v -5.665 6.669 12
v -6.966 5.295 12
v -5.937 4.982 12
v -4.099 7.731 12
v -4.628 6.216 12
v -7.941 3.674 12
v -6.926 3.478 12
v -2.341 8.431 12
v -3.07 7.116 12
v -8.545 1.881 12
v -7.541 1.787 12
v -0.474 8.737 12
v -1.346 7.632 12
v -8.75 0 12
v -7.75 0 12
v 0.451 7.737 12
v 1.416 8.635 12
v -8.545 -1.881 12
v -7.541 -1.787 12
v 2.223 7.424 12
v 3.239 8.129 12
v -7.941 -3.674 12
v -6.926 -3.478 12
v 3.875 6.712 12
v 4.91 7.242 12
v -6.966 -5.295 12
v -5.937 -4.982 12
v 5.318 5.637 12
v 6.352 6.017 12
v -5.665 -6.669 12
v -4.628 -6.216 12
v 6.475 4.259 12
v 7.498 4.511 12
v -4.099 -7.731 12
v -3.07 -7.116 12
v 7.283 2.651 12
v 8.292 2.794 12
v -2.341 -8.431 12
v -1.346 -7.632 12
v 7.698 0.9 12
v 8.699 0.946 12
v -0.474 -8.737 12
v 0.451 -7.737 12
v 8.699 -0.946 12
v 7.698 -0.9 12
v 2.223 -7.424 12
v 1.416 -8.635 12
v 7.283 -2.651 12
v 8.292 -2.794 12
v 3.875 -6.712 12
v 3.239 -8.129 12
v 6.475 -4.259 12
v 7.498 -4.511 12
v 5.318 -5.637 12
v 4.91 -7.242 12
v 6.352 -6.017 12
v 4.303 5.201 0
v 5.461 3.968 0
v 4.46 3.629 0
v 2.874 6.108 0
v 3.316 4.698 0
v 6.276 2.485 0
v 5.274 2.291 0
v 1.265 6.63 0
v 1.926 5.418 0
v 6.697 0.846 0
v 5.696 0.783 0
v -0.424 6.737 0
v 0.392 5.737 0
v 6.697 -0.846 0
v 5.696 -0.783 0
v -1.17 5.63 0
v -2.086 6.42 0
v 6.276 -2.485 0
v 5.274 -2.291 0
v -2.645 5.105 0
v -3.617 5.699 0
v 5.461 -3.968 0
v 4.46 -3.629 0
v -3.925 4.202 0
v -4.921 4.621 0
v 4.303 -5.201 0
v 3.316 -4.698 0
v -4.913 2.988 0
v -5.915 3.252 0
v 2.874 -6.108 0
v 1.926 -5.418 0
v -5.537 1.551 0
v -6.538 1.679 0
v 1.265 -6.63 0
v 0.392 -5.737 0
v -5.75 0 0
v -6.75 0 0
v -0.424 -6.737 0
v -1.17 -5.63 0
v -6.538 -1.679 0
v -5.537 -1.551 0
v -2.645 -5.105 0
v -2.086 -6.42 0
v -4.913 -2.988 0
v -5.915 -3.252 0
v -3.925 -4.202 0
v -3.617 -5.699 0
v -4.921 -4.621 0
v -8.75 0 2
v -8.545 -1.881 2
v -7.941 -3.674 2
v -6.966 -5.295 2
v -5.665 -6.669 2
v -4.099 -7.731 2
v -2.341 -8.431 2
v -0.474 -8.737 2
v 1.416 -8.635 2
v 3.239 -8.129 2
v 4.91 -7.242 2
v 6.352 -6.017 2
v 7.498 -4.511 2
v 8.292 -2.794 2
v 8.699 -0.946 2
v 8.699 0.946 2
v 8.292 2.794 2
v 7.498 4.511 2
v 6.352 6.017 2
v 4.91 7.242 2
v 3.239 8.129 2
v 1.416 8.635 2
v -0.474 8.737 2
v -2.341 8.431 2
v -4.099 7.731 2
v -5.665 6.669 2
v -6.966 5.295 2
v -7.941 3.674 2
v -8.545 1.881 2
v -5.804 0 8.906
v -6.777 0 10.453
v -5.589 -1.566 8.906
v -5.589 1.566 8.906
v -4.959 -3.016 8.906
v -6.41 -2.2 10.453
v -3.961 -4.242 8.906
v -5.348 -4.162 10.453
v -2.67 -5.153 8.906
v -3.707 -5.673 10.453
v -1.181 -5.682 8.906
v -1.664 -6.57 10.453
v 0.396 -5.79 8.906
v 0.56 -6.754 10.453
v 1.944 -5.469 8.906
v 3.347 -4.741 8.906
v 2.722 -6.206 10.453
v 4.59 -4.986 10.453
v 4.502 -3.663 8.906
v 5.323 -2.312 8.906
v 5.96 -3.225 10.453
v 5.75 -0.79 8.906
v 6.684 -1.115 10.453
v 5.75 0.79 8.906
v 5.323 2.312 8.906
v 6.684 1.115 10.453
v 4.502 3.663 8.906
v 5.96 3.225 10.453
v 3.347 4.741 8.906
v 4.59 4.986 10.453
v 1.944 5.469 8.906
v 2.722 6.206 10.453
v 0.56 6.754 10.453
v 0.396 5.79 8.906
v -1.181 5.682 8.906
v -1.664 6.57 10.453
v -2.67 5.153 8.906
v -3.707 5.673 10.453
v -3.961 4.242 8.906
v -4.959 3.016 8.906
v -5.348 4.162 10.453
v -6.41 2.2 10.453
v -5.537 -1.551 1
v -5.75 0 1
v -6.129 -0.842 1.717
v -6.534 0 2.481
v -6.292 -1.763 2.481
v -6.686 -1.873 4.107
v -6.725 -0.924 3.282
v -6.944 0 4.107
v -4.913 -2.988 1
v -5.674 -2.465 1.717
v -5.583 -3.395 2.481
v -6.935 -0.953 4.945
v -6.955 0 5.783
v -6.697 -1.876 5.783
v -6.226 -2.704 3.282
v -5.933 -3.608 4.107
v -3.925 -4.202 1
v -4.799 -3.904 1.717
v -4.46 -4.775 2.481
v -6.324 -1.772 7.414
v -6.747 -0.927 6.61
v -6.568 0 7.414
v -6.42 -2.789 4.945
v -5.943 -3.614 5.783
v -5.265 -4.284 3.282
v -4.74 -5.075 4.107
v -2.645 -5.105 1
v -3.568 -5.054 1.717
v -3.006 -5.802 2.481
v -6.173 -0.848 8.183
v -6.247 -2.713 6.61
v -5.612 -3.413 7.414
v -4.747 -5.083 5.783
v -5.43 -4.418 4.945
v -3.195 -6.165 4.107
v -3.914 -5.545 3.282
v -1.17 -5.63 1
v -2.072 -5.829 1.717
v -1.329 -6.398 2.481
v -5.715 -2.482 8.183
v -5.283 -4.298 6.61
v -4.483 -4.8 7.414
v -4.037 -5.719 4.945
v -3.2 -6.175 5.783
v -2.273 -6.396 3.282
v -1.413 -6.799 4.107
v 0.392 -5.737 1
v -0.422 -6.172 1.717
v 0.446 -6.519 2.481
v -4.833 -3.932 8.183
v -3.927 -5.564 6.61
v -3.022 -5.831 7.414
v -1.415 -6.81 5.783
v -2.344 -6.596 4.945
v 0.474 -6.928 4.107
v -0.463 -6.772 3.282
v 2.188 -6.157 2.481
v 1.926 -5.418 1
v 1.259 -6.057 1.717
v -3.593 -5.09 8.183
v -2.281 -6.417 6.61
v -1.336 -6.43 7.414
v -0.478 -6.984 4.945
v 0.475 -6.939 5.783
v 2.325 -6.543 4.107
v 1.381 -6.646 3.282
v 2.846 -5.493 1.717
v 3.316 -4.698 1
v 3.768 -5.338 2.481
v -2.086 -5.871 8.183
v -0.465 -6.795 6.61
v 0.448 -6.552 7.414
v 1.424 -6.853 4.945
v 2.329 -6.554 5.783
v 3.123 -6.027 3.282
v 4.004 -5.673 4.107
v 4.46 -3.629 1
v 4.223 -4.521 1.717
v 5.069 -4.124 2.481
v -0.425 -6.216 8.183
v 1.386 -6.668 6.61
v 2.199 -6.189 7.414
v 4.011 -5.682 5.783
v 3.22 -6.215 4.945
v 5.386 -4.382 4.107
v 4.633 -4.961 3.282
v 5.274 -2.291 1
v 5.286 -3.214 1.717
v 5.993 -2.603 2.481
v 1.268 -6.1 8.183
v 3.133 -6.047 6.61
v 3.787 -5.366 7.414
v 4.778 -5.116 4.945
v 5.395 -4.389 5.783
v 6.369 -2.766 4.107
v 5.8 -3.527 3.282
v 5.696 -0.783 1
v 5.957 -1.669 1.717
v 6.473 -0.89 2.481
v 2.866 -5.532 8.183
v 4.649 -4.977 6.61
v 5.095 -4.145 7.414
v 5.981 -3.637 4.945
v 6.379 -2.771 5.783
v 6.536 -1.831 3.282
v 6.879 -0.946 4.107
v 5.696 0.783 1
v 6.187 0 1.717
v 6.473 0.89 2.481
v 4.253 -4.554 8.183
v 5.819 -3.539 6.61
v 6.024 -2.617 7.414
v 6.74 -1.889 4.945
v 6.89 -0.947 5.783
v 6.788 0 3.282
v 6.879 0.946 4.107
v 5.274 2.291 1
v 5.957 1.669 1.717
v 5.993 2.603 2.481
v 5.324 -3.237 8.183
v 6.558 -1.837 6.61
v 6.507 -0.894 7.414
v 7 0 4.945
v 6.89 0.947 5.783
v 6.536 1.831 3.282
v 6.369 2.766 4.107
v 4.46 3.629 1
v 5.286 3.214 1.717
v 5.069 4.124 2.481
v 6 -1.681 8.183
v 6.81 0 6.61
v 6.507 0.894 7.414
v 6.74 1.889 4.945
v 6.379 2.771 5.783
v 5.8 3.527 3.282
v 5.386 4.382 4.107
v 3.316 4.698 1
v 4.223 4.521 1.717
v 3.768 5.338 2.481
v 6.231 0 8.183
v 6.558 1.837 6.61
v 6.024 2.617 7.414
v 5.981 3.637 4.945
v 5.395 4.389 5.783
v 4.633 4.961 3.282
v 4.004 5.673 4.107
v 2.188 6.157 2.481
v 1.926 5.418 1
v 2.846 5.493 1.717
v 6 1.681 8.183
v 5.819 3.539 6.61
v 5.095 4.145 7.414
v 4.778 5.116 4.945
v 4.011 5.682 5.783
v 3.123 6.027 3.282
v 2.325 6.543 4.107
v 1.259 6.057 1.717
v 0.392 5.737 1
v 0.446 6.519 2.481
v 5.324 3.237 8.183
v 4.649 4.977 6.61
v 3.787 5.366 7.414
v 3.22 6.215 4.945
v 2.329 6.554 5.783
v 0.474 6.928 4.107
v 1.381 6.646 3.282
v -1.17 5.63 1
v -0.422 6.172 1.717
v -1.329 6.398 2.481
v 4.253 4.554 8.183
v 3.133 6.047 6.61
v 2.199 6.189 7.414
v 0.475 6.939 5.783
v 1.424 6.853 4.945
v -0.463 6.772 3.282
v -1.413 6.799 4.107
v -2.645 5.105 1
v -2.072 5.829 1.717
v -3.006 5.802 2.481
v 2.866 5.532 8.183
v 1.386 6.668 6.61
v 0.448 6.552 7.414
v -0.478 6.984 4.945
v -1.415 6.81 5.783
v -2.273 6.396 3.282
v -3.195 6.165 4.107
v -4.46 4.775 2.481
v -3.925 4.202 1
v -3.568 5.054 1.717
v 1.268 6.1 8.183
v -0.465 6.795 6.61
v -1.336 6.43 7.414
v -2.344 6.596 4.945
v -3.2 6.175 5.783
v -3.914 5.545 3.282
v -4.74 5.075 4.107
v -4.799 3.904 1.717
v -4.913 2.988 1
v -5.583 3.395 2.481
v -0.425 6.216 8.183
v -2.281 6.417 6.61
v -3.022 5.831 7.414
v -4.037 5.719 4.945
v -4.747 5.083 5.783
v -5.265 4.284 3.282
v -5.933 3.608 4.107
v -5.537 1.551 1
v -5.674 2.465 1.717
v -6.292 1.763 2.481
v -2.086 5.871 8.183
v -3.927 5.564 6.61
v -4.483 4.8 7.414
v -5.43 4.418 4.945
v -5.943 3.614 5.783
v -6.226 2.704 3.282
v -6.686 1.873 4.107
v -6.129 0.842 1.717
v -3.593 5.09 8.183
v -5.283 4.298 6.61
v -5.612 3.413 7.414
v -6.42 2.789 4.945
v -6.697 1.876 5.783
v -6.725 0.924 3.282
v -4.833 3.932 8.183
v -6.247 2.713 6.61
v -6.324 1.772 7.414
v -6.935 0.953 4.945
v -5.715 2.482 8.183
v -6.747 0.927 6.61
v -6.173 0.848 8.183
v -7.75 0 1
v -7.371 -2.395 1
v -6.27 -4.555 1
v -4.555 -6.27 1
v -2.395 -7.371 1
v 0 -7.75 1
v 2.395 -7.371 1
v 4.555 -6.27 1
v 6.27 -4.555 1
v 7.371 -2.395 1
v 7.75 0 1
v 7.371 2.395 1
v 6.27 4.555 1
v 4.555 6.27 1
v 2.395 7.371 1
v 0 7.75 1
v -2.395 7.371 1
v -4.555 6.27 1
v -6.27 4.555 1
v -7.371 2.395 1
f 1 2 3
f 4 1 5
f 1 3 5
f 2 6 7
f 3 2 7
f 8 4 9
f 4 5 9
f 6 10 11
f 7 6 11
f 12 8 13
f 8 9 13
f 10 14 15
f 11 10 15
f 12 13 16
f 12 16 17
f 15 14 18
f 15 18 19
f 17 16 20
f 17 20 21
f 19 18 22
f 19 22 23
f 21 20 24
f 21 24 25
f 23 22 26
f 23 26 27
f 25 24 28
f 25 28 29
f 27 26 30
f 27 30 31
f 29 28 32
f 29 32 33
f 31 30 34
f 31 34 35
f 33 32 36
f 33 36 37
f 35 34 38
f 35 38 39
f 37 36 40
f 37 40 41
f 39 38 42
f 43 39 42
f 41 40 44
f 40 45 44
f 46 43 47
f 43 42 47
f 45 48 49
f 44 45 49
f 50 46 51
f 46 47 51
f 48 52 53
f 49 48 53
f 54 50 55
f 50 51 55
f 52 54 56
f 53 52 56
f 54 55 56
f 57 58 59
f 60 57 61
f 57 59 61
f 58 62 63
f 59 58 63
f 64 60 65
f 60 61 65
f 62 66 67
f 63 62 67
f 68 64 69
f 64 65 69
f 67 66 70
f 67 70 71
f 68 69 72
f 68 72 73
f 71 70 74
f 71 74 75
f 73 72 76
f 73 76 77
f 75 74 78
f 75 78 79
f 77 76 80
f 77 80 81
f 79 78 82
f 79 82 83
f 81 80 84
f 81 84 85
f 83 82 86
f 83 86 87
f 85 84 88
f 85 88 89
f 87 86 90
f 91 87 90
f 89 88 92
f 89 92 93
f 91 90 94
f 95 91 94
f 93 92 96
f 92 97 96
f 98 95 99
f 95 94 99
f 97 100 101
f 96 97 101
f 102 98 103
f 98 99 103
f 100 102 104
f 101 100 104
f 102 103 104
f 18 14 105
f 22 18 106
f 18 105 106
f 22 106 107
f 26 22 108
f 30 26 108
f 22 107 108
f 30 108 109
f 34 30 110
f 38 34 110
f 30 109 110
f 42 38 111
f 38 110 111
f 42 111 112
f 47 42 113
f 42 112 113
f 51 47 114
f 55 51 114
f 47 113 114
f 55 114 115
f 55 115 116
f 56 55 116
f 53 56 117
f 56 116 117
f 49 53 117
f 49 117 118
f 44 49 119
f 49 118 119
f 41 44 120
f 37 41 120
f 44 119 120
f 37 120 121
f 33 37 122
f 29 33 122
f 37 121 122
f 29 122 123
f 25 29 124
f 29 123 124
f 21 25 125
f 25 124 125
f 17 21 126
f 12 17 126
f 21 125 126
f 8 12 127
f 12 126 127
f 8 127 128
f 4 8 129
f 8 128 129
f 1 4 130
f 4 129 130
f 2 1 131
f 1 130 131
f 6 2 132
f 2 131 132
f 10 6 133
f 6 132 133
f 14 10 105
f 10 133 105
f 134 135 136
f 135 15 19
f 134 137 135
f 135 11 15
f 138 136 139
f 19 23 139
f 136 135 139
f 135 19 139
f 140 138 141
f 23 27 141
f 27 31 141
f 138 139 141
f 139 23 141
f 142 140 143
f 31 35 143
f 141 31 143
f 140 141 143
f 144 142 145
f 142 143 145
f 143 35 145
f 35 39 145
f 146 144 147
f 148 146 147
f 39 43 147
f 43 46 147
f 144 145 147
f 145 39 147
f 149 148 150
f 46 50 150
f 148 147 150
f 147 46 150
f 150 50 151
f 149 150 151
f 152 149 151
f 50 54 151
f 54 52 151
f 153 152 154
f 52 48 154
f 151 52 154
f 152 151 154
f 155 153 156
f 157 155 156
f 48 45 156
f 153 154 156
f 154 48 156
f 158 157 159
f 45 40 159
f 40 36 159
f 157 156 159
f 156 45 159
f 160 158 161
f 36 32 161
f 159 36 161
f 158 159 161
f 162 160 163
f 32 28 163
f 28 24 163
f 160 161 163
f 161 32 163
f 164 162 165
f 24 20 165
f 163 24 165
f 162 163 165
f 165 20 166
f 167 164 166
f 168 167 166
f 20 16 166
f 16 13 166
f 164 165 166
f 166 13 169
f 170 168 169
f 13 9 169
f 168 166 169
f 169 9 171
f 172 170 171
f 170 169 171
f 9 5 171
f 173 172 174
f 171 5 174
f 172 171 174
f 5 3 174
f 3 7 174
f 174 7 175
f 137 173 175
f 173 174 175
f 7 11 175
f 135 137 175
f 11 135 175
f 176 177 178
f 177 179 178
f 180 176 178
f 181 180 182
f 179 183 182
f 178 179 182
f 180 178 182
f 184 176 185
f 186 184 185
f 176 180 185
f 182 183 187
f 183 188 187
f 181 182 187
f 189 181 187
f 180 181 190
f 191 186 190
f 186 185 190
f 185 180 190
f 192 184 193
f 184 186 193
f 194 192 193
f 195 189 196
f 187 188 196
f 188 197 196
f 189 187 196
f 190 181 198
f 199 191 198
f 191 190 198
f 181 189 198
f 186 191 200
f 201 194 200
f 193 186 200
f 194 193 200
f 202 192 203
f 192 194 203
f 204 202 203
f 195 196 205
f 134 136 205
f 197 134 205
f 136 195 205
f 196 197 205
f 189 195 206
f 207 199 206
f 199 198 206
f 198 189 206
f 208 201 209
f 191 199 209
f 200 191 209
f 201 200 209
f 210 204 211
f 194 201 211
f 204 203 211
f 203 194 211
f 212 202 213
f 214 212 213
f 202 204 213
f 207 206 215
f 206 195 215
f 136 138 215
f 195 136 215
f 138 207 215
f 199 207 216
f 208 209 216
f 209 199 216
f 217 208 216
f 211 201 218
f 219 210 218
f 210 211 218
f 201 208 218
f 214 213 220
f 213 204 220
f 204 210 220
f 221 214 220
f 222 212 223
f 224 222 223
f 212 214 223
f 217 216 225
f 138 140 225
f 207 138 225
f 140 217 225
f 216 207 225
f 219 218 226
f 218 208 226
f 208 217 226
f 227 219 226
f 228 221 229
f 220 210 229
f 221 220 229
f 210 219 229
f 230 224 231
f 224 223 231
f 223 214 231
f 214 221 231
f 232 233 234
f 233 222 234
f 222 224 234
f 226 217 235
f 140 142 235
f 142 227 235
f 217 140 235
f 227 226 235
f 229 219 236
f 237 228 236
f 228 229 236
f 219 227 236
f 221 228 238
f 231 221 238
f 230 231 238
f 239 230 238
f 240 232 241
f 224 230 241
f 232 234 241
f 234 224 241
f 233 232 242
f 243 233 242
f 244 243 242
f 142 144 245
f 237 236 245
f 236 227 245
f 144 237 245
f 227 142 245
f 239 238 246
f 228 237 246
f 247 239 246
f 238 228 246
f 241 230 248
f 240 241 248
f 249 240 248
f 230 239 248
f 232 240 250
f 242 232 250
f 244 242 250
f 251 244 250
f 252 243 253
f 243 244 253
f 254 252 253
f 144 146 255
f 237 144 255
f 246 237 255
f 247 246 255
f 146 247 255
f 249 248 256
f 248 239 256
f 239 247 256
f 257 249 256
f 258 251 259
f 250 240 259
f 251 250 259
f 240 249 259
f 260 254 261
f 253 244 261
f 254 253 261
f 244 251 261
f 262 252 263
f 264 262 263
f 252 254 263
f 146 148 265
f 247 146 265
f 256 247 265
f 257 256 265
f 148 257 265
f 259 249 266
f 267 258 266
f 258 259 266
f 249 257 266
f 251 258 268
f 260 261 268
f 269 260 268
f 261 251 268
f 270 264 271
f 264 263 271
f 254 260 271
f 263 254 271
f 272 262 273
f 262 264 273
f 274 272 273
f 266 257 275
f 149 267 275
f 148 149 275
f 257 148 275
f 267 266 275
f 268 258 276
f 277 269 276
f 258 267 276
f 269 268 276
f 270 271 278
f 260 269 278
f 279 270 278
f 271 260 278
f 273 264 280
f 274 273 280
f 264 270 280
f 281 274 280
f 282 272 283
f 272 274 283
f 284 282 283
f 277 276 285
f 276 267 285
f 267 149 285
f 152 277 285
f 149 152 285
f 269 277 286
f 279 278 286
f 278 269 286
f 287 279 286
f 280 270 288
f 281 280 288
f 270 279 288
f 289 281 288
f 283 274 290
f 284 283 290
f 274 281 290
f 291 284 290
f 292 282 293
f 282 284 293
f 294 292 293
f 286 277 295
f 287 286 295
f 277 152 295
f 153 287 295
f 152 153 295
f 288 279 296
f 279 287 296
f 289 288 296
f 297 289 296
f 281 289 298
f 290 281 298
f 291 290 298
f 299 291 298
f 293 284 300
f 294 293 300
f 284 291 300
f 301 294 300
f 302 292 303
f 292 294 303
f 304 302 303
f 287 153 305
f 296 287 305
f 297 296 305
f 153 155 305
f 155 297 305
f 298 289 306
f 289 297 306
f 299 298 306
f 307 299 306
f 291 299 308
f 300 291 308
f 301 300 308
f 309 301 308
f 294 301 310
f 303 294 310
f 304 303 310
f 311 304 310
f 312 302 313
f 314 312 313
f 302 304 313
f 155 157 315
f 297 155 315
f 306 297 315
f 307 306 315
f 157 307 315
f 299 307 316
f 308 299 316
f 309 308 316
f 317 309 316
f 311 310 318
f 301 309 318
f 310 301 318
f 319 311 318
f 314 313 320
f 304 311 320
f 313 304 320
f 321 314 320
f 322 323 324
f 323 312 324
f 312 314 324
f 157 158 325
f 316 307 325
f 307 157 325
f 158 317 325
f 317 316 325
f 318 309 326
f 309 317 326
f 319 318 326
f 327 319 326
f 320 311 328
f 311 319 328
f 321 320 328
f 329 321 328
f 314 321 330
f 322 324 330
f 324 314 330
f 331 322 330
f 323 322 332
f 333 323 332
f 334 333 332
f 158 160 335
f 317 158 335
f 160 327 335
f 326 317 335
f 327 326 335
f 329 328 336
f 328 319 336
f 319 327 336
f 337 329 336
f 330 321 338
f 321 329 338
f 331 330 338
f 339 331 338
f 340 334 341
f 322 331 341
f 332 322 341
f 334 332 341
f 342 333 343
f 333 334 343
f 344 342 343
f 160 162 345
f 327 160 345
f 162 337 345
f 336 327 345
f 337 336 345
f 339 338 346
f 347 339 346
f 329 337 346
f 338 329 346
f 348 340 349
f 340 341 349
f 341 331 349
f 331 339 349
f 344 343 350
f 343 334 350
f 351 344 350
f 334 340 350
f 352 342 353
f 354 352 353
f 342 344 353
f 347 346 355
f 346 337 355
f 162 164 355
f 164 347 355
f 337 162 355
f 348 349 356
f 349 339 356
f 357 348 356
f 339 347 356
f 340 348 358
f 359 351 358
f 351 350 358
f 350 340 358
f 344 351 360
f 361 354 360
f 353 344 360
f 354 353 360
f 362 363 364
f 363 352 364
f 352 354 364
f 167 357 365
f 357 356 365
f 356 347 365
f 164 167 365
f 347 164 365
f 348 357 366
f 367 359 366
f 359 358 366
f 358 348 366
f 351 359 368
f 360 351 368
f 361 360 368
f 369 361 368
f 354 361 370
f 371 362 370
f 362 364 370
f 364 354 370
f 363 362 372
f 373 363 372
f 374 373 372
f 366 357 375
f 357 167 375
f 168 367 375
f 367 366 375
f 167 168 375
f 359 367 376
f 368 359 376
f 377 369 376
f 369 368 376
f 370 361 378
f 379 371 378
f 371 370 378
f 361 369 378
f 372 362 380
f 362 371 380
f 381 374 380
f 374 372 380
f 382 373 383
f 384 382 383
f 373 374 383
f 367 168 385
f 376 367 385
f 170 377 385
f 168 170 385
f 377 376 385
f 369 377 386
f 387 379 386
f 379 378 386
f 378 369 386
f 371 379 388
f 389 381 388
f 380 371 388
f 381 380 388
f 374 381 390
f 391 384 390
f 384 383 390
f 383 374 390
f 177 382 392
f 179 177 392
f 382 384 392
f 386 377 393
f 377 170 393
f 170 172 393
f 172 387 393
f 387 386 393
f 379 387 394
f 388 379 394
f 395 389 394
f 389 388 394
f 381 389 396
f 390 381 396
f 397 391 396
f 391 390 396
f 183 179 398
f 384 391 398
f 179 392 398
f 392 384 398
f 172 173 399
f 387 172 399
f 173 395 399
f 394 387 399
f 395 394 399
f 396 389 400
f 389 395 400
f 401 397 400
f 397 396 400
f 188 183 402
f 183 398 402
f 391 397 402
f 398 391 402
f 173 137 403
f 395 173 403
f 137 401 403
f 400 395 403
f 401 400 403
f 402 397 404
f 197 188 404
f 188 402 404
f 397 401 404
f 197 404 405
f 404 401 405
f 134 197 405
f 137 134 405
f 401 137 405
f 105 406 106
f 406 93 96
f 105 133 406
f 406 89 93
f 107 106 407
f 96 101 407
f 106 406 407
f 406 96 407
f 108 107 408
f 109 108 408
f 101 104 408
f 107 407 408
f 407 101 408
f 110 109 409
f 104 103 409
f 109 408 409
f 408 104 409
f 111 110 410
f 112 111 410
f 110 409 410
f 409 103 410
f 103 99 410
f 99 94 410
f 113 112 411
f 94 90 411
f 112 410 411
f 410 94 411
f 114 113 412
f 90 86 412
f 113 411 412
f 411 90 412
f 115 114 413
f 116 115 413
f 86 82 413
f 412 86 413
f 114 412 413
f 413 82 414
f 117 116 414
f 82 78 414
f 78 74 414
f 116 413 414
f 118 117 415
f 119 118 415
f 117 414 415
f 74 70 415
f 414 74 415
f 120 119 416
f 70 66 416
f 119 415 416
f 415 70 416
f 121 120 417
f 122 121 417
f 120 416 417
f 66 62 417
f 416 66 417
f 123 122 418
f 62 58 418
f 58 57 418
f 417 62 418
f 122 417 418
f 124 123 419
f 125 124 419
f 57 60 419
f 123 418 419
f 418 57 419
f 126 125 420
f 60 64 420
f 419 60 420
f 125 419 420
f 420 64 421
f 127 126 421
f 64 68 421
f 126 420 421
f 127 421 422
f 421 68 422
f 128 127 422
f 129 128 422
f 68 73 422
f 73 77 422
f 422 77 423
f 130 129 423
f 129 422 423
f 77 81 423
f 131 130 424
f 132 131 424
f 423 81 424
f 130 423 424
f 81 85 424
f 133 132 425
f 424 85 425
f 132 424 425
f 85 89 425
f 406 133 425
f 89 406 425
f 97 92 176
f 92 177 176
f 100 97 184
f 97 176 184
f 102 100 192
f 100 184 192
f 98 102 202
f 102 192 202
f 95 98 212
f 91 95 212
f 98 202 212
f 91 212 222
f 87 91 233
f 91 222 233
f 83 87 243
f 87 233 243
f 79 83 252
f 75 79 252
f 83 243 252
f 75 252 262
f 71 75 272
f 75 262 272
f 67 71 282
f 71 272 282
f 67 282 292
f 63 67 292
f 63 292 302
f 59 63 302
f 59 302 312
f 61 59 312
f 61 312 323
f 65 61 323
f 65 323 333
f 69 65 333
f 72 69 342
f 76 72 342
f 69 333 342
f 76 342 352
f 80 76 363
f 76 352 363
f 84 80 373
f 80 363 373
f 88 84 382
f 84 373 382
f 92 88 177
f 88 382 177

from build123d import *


with BuildPart() as f1:
    # F0 (on Front) → F1 (revolve)
    with BuildSketch(Plane.XZ):
        with BuildLine():
            ThreePointArc((-5.75, 1), (-6.999838, 4.944596), (-5.803743, 8.905819))
            Line((-5.803743, 8.905819), (-7.75, 12))
            Line((-7.75, 12), (-8.75, 12))
            Line((-8.75, 12), (-8.75, 2))
            Line((-8.75, 2), (-6.75, 0))
            Line((-6.75, 0), (-5.75, 0))
            Line((-5.75, 0), (-5.75, 1))
        make_face()
    revolve(axis=Axis((0, 0, 4.99218), (0, 0, 1)))


solid = f1.part
